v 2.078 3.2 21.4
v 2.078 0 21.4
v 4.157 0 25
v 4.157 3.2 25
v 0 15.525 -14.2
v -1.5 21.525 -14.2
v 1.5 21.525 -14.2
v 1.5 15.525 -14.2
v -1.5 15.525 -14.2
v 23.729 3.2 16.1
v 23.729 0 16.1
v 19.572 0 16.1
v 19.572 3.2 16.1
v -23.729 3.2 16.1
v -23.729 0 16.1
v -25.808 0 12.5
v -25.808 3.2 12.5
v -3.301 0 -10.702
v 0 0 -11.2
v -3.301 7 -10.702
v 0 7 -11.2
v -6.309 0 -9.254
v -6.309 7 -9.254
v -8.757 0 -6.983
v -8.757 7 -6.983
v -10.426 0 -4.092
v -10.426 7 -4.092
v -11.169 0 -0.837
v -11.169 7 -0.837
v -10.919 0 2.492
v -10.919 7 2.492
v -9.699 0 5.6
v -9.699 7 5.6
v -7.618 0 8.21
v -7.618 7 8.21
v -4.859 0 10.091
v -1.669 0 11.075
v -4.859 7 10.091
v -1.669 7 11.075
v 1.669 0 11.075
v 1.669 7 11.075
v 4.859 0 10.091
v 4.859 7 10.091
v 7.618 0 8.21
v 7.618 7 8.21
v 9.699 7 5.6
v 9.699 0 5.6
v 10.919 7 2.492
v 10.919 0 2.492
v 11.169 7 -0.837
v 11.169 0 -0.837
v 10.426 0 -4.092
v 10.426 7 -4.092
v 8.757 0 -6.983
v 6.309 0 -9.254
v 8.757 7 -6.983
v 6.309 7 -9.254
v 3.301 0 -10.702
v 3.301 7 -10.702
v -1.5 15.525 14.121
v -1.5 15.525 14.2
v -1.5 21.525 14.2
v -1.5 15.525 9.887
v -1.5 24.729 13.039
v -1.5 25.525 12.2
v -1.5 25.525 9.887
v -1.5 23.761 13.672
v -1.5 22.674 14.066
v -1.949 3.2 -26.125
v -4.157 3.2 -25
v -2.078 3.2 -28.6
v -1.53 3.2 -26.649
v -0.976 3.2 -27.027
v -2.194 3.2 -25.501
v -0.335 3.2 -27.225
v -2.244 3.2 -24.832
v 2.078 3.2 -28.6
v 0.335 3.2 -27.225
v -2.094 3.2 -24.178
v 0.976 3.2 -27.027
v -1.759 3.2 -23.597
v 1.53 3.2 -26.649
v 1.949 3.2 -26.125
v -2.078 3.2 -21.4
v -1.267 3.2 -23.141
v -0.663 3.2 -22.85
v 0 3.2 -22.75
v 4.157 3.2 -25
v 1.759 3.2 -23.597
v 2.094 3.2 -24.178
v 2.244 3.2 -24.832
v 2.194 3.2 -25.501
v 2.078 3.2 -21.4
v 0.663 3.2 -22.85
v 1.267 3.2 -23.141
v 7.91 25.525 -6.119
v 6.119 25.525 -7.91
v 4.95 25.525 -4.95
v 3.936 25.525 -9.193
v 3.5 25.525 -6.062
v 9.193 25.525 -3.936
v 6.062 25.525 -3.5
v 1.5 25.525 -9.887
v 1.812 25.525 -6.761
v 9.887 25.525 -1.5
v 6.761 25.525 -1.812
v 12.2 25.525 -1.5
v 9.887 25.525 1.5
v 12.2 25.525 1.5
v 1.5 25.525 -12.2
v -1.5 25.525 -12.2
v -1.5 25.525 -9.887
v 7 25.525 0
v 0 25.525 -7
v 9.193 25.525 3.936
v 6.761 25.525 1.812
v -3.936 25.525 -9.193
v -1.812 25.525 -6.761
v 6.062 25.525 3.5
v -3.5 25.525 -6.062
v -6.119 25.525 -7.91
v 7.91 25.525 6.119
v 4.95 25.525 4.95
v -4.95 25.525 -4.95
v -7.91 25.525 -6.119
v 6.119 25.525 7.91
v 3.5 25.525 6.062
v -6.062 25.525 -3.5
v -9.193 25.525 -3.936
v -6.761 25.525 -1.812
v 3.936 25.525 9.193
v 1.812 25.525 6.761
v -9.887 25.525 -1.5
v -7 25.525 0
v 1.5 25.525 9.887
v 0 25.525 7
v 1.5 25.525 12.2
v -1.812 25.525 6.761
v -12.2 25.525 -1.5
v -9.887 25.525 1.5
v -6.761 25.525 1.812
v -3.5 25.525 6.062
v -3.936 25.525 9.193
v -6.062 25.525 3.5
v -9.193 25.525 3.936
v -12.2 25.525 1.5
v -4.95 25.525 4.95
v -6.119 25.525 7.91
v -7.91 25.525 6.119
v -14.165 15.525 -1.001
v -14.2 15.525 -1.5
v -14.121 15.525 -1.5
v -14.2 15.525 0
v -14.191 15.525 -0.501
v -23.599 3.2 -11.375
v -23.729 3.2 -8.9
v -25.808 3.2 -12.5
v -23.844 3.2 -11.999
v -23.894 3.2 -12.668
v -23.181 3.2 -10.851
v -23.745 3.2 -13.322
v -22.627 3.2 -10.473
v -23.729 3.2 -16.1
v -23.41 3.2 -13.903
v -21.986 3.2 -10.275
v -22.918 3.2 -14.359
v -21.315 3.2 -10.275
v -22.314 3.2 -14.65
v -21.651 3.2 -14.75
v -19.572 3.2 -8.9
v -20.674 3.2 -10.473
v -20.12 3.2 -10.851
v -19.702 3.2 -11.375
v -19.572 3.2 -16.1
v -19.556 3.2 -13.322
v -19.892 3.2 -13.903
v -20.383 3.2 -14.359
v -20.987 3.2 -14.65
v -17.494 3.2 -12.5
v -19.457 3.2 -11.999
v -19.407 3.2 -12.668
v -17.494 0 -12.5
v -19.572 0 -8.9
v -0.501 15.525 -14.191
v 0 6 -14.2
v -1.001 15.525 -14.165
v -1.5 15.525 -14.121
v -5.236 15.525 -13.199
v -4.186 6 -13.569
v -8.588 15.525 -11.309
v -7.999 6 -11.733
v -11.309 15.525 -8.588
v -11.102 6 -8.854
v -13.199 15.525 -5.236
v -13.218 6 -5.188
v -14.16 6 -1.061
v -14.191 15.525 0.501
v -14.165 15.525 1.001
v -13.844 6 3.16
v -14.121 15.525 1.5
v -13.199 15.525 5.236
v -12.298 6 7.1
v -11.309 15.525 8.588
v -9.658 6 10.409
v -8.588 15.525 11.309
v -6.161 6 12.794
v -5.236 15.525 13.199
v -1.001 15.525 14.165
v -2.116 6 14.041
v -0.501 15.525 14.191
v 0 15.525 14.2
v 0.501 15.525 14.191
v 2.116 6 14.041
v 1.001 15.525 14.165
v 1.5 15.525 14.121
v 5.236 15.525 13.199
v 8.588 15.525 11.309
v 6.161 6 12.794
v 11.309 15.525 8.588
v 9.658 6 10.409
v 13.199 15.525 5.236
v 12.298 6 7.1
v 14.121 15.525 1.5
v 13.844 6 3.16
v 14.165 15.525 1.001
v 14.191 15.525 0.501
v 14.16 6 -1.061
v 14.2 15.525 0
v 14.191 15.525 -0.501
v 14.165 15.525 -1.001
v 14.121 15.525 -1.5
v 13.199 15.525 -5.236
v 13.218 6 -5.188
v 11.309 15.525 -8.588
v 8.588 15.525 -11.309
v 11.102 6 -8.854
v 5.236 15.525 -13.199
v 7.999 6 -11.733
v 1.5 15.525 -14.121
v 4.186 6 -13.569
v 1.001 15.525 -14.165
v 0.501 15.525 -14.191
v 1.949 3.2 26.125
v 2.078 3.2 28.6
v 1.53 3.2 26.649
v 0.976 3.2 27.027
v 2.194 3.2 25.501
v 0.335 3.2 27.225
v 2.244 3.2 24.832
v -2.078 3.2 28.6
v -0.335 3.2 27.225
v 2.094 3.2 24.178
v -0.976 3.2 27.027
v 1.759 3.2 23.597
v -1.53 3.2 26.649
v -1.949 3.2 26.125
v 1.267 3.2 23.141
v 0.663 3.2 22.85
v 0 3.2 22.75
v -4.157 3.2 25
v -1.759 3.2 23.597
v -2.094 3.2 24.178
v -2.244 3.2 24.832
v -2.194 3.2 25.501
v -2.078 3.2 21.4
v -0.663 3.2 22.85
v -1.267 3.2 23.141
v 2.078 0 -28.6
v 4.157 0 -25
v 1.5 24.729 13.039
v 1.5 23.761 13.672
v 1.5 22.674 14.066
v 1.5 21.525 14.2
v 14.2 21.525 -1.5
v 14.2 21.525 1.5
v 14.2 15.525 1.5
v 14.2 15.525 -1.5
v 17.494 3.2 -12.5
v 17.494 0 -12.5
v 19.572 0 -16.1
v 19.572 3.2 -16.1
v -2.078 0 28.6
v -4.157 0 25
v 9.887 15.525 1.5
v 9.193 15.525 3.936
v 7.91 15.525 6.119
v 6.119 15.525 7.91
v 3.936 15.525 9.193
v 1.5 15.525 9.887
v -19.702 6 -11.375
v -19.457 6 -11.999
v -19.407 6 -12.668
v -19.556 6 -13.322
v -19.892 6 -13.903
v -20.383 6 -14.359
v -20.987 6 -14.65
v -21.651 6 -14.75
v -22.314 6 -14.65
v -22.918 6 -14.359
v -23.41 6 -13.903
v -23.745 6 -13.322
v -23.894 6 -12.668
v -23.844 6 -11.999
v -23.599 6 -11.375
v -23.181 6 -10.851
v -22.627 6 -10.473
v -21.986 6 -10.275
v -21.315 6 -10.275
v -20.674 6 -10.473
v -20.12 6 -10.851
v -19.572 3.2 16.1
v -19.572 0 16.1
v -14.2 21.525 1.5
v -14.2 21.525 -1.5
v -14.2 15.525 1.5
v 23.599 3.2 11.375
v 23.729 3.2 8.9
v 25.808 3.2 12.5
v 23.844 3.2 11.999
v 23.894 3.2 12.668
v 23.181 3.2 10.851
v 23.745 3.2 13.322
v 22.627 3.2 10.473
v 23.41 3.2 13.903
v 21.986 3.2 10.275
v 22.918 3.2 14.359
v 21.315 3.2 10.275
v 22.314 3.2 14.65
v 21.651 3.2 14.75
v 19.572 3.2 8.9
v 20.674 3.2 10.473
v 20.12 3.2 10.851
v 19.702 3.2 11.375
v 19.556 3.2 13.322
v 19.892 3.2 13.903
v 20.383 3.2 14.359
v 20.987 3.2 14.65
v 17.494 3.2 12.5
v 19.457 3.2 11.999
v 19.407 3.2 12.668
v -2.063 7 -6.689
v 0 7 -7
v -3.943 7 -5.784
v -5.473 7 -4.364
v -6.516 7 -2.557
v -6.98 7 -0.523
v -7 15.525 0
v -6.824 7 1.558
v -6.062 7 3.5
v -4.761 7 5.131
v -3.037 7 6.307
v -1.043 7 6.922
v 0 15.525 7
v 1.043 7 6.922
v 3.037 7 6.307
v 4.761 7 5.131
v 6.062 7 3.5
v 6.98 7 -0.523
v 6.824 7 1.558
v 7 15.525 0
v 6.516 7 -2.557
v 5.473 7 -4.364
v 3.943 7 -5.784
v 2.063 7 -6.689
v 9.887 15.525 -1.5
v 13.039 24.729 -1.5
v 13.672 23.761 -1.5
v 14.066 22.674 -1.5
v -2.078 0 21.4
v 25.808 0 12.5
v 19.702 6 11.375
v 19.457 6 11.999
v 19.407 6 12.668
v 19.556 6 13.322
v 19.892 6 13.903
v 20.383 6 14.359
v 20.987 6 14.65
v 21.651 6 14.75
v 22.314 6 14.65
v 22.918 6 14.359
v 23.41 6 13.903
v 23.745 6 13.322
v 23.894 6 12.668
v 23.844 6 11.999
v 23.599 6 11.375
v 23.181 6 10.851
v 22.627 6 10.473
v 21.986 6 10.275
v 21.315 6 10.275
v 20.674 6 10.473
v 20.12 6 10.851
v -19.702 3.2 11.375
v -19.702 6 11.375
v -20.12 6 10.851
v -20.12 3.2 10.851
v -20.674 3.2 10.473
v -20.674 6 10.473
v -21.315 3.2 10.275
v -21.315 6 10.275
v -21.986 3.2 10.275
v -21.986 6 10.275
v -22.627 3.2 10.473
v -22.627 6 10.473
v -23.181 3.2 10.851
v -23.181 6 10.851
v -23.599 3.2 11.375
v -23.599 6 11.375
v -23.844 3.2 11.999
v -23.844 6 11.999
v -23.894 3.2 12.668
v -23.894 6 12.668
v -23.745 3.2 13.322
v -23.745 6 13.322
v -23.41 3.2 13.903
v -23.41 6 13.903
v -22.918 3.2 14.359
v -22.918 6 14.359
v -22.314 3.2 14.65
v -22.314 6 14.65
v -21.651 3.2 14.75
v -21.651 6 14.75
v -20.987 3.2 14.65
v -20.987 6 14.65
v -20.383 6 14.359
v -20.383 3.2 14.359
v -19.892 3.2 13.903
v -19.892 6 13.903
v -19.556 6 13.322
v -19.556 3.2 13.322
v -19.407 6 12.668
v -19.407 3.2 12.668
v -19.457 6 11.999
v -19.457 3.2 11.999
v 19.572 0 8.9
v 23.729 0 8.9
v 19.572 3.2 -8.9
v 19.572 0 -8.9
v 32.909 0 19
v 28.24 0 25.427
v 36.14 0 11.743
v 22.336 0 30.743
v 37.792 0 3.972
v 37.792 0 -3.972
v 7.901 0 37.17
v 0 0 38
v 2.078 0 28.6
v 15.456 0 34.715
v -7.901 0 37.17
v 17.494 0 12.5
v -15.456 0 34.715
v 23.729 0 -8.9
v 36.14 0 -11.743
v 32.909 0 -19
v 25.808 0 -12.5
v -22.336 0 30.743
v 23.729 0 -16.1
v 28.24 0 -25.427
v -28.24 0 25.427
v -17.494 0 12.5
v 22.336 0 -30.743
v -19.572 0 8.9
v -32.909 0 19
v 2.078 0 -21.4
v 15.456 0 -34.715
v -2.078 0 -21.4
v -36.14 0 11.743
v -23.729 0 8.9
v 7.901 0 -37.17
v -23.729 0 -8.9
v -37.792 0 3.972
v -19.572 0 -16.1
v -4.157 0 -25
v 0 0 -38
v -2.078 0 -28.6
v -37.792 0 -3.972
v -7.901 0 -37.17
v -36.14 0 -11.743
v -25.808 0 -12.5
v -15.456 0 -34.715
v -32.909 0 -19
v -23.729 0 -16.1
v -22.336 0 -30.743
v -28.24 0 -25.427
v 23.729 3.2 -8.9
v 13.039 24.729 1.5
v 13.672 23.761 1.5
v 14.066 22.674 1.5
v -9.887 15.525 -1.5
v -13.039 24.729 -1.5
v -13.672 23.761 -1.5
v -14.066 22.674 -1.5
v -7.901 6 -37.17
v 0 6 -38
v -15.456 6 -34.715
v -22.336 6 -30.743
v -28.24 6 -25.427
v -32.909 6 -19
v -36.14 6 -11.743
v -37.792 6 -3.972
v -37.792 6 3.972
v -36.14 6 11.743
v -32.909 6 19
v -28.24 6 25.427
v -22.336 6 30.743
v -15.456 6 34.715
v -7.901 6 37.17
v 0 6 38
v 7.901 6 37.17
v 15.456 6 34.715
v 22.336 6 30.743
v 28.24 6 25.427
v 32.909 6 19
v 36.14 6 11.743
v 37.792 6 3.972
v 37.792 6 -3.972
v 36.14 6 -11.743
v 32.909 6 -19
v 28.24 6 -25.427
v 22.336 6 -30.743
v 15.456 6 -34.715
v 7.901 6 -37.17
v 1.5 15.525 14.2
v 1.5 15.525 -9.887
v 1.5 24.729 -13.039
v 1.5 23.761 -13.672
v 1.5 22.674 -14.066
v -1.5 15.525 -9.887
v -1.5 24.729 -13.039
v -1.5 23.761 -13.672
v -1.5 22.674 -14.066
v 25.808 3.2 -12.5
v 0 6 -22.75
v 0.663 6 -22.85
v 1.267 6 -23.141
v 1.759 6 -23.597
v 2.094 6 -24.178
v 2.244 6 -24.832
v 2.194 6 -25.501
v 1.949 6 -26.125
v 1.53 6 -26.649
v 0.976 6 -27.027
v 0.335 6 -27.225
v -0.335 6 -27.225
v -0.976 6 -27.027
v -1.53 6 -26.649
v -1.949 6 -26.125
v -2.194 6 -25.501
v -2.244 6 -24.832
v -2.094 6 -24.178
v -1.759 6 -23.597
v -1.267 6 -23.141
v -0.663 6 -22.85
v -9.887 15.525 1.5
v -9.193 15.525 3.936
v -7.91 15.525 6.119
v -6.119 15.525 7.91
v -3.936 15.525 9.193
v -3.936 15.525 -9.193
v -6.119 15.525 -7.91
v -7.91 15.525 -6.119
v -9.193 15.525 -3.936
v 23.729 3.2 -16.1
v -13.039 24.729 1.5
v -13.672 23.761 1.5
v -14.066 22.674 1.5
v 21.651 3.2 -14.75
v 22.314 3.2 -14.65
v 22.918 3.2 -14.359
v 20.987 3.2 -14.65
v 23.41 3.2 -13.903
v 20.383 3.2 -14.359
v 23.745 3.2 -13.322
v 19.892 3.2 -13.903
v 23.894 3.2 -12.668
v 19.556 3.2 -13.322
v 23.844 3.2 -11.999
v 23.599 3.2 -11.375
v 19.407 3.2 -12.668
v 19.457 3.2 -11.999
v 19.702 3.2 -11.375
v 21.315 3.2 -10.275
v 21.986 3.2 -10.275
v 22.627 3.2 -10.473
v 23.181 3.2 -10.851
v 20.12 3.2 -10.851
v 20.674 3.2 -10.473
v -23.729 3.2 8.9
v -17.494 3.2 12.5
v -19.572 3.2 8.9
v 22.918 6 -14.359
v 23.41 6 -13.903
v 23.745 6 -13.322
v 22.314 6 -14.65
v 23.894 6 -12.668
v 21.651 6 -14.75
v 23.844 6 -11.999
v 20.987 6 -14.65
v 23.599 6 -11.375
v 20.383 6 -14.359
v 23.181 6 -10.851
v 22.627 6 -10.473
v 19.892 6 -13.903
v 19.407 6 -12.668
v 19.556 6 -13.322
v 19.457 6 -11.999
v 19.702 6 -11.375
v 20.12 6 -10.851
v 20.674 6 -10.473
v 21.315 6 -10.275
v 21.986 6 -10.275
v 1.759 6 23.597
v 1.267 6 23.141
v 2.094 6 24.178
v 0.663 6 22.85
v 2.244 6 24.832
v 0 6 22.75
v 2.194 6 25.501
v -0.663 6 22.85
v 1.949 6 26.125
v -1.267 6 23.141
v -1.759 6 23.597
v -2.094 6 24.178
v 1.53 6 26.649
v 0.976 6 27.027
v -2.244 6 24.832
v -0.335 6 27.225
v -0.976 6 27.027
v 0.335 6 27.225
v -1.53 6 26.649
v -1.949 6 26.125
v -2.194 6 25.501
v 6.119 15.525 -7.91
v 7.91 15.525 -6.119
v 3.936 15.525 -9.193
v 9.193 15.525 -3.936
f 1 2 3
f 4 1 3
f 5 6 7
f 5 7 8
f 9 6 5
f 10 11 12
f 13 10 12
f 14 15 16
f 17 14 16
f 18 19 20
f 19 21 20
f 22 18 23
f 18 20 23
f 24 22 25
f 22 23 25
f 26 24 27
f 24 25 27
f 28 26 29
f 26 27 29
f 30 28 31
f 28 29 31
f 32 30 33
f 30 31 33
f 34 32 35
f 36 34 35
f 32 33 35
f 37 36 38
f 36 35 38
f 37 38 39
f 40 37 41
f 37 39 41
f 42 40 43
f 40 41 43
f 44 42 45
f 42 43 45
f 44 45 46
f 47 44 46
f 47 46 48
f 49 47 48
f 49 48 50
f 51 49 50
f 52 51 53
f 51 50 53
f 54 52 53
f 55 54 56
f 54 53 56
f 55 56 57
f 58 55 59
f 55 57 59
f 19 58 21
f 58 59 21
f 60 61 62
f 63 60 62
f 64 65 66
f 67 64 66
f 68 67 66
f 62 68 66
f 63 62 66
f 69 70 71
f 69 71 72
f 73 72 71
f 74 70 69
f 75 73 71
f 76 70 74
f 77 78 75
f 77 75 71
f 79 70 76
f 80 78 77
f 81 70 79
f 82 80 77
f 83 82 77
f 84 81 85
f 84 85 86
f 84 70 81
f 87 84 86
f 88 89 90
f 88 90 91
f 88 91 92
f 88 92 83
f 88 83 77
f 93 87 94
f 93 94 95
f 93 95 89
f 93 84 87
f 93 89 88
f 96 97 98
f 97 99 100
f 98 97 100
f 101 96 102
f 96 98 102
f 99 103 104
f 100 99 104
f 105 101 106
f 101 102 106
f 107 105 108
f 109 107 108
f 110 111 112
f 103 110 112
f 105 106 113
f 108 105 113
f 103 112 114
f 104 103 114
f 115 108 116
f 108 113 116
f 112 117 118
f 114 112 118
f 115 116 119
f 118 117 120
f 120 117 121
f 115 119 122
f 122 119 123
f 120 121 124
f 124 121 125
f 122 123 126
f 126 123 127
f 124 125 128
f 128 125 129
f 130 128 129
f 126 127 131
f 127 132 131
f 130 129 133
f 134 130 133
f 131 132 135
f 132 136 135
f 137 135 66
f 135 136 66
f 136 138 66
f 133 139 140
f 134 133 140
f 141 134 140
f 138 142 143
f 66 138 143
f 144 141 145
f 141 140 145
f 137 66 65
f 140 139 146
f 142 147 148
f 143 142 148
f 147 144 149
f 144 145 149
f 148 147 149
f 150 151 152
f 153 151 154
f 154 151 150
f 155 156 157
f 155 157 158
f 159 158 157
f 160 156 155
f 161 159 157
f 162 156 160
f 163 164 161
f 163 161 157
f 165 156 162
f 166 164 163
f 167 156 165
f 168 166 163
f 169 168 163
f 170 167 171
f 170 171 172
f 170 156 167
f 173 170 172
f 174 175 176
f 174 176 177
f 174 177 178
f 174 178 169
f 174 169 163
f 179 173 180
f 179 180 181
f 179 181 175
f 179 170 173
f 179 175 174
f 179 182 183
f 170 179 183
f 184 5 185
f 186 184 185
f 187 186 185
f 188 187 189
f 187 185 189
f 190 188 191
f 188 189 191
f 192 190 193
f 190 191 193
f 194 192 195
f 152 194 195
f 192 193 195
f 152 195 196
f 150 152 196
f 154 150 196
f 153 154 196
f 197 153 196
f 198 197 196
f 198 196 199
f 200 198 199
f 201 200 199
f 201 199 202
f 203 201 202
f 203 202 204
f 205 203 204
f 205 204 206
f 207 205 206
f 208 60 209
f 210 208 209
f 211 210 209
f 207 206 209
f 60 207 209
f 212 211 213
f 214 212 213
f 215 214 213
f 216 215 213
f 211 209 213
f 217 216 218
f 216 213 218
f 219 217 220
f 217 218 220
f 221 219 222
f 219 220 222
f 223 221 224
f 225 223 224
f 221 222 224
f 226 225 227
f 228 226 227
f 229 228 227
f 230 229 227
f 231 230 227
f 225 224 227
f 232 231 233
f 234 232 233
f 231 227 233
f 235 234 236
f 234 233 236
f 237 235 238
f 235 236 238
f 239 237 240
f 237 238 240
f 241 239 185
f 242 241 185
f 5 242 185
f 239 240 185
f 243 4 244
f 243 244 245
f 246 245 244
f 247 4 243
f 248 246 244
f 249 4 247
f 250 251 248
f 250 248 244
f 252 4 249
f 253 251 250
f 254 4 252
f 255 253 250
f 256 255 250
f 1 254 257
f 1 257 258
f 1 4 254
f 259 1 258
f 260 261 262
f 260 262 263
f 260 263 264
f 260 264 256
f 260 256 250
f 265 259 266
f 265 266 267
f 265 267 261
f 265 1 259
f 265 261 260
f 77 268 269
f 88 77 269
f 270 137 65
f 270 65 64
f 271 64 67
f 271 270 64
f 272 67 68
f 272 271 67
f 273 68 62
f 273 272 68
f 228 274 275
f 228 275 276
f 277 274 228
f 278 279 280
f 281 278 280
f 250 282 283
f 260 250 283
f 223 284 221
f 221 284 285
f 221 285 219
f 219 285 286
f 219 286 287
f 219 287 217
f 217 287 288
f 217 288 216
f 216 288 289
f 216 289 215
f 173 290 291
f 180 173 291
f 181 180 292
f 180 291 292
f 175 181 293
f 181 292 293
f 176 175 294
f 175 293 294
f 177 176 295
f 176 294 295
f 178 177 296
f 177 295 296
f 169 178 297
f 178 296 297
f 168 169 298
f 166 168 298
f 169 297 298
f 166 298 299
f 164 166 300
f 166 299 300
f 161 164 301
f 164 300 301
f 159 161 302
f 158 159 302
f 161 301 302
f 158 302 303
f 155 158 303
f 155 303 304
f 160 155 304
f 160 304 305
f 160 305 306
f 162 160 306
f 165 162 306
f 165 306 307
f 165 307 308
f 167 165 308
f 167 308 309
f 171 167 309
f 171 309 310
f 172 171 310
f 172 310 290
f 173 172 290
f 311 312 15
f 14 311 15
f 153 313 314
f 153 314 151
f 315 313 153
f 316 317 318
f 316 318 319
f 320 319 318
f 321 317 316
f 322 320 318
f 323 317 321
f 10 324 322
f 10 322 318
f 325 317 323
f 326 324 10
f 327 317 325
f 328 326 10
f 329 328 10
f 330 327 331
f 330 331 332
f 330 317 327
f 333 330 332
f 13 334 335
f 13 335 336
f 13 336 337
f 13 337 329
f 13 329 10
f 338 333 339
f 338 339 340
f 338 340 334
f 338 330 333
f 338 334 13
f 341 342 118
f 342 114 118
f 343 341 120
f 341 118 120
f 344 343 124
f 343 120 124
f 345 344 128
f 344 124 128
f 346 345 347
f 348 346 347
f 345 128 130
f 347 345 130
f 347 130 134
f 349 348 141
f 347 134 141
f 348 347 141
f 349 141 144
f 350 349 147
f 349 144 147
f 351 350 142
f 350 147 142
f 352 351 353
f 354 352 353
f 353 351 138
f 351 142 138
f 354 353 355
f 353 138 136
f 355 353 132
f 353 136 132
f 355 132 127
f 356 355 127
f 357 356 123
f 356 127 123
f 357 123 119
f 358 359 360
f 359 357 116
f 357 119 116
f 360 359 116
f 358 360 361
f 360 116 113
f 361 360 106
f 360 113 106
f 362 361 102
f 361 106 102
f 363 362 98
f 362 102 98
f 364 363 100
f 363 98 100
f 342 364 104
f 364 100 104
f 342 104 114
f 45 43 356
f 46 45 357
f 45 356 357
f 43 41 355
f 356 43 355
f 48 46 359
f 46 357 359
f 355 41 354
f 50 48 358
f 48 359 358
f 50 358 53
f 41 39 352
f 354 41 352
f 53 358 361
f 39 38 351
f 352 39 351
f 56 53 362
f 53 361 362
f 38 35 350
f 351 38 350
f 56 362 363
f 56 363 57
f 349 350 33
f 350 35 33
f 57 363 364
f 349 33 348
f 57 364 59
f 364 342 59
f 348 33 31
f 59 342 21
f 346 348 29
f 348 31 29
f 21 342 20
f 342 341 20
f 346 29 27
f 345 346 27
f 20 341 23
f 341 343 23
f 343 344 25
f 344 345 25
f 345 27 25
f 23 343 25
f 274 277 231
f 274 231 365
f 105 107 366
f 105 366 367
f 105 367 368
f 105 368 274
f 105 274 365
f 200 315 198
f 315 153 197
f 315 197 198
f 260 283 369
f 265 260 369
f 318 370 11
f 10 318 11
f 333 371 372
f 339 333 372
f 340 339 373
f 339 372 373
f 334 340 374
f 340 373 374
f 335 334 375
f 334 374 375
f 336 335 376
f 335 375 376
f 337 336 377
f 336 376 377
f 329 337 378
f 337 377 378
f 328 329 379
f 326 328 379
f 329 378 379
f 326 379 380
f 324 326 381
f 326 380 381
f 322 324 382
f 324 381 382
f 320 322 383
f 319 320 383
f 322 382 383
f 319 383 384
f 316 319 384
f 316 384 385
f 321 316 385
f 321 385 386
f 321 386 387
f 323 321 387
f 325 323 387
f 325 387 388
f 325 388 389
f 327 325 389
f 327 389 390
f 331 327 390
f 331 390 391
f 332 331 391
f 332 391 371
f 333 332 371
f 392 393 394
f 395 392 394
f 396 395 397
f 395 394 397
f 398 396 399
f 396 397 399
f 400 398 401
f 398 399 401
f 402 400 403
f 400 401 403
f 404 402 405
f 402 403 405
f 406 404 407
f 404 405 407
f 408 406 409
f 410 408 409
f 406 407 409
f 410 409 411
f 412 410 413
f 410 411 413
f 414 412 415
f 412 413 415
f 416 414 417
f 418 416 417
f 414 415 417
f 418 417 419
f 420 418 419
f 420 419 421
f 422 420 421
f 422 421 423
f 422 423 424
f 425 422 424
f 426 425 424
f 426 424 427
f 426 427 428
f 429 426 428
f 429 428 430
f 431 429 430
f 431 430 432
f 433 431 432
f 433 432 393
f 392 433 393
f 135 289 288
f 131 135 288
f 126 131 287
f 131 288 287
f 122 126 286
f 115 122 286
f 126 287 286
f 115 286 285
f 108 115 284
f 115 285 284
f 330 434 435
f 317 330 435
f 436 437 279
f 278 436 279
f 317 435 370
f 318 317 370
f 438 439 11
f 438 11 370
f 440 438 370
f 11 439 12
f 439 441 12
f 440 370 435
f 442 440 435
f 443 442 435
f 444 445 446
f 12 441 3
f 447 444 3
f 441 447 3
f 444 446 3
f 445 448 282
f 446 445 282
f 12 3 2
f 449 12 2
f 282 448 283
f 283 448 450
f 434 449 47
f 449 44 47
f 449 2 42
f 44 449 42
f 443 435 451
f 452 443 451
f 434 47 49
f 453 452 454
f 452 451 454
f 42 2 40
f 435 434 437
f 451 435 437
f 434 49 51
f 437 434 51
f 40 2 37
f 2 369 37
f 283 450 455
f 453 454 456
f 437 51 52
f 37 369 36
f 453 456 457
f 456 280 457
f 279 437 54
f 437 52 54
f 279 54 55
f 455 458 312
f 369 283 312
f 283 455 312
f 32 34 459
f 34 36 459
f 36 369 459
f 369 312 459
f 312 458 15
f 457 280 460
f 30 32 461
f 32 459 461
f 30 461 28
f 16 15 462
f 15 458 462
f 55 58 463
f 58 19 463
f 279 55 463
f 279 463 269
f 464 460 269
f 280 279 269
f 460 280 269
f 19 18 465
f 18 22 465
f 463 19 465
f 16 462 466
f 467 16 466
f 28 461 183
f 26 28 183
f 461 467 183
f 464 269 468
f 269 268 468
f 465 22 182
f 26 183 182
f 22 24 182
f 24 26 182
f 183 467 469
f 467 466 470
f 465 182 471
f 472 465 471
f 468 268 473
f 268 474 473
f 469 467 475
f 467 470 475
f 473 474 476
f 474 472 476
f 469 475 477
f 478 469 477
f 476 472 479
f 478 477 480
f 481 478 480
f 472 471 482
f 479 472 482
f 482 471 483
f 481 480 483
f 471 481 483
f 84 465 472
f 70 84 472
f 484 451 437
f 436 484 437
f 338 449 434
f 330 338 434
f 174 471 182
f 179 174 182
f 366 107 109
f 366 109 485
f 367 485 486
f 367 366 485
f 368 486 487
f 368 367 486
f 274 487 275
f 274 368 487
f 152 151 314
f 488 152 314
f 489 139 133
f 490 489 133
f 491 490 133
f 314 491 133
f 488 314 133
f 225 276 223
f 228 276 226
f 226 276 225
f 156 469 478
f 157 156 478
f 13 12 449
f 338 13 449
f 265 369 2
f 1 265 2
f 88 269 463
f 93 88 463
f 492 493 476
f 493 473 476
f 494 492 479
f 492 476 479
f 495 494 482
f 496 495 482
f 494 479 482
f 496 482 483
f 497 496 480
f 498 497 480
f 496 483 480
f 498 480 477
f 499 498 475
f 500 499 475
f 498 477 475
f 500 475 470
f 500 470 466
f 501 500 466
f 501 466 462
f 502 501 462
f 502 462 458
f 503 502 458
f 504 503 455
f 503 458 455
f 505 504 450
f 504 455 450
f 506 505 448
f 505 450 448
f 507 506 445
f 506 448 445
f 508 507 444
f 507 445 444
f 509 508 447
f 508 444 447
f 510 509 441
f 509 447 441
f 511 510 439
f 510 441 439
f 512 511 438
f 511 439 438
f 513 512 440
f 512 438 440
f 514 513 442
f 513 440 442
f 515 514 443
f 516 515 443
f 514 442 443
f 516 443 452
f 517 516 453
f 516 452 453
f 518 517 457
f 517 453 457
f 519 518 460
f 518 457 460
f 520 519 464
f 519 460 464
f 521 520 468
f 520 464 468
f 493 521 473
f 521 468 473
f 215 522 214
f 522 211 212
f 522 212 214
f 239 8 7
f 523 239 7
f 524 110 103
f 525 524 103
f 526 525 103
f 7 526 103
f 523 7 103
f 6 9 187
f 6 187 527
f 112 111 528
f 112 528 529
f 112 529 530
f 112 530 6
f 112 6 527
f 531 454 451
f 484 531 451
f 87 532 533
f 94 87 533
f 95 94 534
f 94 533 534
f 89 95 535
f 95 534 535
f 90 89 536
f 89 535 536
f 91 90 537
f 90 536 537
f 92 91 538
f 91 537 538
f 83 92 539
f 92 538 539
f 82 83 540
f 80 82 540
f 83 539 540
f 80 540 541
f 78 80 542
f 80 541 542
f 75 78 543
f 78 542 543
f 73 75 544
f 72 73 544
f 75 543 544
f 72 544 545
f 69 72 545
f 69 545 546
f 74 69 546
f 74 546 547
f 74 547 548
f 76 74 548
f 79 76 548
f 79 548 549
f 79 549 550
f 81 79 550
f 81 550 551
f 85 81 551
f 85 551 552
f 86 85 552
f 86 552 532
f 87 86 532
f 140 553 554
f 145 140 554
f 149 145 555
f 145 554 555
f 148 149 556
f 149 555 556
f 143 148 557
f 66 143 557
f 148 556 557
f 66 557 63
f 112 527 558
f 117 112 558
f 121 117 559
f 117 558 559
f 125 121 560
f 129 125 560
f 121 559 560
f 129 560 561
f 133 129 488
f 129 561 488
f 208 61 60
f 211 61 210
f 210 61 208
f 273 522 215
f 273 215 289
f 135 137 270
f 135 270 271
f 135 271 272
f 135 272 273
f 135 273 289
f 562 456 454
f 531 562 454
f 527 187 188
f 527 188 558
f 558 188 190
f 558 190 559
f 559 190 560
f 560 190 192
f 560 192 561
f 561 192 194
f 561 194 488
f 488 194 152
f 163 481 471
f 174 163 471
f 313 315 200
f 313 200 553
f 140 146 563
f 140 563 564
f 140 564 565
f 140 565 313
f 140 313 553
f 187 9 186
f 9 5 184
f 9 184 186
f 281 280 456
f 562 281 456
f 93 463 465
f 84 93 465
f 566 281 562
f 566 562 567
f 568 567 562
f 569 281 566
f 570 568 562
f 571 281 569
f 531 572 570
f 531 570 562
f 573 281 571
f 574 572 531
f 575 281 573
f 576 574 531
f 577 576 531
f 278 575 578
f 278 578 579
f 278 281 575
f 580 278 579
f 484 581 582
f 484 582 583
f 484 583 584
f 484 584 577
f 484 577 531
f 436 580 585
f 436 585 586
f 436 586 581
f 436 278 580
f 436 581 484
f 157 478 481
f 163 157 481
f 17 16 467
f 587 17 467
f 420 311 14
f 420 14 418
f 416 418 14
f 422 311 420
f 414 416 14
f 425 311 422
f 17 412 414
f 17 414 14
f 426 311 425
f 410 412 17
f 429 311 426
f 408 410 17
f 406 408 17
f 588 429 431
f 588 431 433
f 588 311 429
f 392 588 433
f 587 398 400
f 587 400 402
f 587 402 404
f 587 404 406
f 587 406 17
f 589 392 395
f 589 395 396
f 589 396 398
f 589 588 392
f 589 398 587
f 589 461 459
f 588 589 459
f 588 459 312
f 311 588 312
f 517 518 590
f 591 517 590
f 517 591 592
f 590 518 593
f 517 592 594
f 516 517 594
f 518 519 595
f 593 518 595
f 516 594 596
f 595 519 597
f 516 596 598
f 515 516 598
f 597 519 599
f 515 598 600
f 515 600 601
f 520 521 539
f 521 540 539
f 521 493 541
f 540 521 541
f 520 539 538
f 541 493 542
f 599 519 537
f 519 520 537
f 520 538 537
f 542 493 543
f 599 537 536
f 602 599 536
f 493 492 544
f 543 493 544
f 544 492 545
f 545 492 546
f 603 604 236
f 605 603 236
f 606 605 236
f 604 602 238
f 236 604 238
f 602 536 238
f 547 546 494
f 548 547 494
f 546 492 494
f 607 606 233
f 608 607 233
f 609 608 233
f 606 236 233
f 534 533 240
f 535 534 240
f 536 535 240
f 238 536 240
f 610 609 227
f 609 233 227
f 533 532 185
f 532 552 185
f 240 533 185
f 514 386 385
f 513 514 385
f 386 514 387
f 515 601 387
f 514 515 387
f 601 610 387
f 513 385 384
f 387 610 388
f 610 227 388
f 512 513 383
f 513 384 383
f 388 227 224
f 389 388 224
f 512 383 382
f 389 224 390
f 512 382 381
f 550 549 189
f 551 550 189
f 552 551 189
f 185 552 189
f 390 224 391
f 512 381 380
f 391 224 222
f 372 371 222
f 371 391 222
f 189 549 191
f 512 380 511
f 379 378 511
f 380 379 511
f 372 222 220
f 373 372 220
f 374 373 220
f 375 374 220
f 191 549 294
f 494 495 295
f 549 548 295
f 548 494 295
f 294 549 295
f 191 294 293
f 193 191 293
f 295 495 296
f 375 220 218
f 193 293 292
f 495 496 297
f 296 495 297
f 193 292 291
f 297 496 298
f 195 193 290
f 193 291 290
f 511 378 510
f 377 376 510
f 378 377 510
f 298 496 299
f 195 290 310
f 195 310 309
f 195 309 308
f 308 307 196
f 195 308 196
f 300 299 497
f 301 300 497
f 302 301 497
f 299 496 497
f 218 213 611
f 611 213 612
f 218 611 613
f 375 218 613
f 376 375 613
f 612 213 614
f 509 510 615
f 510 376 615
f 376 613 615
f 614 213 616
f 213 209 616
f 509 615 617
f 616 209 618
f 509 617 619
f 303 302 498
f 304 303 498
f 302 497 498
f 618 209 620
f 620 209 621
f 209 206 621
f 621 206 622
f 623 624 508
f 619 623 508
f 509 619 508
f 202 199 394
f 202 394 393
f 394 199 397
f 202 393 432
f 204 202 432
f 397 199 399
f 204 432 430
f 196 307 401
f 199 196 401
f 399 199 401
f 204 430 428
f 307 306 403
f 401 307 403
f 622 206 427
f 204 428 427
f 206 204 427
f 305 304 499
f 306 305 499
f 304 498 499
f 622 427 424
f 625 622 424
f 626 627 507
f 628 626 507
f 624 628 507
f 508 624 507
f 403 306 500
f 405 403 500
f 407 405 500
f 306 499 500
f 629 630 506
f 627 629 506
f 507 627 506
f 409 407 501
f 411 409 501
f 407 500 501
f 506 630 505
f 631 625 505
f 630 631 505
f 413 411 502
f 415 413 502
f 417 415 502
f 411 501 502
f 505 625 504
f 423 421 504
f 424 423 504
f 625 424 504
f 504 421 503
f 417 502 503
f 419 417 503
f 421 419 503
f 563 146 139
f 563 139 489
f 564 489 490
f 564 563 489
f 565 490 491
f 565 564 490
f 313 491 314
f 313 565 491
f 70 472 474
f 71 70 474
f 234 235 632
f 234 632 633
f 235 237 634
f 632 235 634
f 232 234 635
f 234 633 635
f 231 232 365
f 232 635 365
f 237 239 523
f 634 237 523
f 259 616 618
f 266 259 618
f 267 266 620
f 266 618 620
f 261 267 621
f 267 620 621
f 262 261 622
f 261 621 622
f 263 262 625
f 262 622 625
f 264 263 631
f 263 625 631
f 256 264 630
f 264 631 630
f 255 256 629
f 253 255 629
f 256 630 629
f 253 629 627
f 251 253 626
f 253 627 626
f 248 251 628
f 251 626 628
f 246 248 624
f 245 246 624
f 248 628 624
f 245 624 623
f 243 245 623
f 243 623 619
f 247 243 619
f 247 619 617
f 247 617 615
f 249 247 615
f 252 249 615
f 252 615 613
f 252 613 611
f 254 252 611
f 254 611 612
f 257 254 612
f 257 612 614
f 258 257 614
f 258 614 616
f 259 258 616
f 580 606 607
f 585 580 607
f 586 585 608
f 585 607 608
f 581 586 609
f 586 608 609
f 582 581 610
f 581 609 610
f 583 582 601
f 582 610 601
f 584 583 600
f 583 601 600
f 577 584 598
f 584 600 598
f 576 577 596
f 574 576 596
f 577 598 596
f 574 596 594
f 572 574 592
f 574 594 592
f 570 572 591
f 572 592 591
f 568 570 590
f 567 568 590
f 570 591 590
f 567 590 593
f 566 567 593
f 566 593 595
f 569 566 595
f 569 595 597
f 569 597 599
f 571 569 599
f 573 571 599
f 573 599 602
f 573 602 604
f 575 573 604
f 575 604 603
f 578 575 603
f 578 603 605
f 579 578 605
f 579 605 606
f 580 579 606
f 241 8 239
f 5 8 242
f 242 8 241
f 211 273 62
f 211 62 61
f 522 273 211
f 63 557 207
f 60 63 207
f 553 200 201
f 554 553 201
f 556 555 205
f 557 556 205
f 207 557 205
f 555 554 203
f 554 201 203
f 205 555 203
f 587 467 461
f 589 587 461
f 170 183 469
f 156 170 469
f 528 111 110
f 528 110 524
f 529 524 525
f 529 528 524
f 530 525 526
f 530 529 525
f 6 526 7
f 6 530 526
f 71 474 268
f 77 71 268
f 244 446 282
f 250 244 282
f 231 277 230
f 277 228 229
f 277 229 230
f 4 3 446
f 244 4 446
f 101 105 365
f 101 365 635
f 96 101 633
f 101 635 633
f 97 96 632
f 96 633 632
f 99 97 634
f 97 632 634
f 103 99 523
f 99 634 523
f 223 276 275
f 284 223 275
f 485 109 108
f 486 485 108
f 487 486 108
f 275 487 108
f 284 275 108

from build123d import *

# Parameters (mm, degrees)
BOSS_EXTRUDE1_DEPTH = 1.5
CIRPATTERN1_COUNT   = 4
SKETCH5_R           = 2.25
CUT_EXTRUDE1_DEPTH  = 58.177142505
CUT_EXTRUDE2_DEPTH  = 3.2
CIRPATTERN2_COUNT   = 6


with BuildPart() as part:
    # Sketch2 → Revolve1 (revolve)
    with BuildSketch(Plane.XY, mode=Mode.PRIVATE) as revolve1_sk:
        Polygon((7, 25.525), (10, 25.525), (10, 15.525), (14.2, 15.525), (14.2, 6), (38, 6), (38, 0), (11.2, 0), (11.2, 7), (7, 7), align=None)
    revolve(revolve1_sk.sketch.rotate(Axis((0, 0, 0), (0, 1, 0)), 90), axis=Axis((0, 0, 0), (0, 1, 0)))

    # Sketch4 → Boss-Extrude1 (add, symmetric)
    with BuildSketch(Plane.XY):
        with BuildLine():
            Line((-7, 25.525), (-12.2, 25.525))
            ThreePointArc((-12.2, 25.525), (-13.672135955, 23.761067977), (-14.2, 21.525))
            Line((-14.2, 21.525), (-14.2, 15.525))
            Line((-14.2, 15.525), (-7, 15.525))
            Line((-7, 15.525), (-7, 25.525))
        make_face()
    boss_extrude1 = extrude(amount=BOSS_EXTRUDE1_DEPTH, both=True)

    # CirPattern1: Boss-Extrude1 ×4 about axis
    cirpattern1_axis = Axis((0, 0, 0), (0, 1, 0))
    for i in range(1, CIRPATTERN1_COUNT):
        add(boss_extrude1.rotate(cirpattern1_axis, i * 360 / CIRPATTERN1_COUNT))

    # Sketch5 → Cut-Extrude1 (cut, through all)
    with BuildSketch(Plane(origin=(0, 6, 0), x_dir=(1, 0, 0), z_dir=(0, 1, 0))):
        with Locations(Location((0, 25, 0), (0, 0, 270))):
            Circle(SKETCH5_R)
    cut_extrude1 = extrude(amount=-CUT_EXTRUDE1_DEPTH, mode=Mode.SUBTRACT)

    # Sketch6 → Cut-Extrude2 (cut)
    with BuildSketch(Plane.XZ):
        Polygon((4.156921938, -25), (2.078460969, -21.4), (-2.078460969, -21.4), (-4.156921938, -25), (-2.078460969, -28.6), (2.078460969, -28.6), align=None)
    cut_extrude2 = extrude(amount=-CUT_EXTRUDE2_DEPTH, mode=Mode.SUBTRACT)

    # CirPattern2: Cut-Extrude1, Cut-Extrude2 ×6 about axis
    cirpattern2_axis = Axis((0, 0, 0), (0, 1, 0))
    add([cut_extrude1.rotate(cirpattern2_axis, i * 360 / CIRPATTERN2_COUNT) for i in range(1, CIRPATTERN2_COUNT)], mode=Mode.SUBTRACT)
    add([cut_extrude2.rotate(cirpattern2_axis, i * 360 / CIRPATTERN2_COUNT) for i in range(1, CIRPATTERN2_COUNT)], mode=Mode.SUBTRACT)


solid = part.part
